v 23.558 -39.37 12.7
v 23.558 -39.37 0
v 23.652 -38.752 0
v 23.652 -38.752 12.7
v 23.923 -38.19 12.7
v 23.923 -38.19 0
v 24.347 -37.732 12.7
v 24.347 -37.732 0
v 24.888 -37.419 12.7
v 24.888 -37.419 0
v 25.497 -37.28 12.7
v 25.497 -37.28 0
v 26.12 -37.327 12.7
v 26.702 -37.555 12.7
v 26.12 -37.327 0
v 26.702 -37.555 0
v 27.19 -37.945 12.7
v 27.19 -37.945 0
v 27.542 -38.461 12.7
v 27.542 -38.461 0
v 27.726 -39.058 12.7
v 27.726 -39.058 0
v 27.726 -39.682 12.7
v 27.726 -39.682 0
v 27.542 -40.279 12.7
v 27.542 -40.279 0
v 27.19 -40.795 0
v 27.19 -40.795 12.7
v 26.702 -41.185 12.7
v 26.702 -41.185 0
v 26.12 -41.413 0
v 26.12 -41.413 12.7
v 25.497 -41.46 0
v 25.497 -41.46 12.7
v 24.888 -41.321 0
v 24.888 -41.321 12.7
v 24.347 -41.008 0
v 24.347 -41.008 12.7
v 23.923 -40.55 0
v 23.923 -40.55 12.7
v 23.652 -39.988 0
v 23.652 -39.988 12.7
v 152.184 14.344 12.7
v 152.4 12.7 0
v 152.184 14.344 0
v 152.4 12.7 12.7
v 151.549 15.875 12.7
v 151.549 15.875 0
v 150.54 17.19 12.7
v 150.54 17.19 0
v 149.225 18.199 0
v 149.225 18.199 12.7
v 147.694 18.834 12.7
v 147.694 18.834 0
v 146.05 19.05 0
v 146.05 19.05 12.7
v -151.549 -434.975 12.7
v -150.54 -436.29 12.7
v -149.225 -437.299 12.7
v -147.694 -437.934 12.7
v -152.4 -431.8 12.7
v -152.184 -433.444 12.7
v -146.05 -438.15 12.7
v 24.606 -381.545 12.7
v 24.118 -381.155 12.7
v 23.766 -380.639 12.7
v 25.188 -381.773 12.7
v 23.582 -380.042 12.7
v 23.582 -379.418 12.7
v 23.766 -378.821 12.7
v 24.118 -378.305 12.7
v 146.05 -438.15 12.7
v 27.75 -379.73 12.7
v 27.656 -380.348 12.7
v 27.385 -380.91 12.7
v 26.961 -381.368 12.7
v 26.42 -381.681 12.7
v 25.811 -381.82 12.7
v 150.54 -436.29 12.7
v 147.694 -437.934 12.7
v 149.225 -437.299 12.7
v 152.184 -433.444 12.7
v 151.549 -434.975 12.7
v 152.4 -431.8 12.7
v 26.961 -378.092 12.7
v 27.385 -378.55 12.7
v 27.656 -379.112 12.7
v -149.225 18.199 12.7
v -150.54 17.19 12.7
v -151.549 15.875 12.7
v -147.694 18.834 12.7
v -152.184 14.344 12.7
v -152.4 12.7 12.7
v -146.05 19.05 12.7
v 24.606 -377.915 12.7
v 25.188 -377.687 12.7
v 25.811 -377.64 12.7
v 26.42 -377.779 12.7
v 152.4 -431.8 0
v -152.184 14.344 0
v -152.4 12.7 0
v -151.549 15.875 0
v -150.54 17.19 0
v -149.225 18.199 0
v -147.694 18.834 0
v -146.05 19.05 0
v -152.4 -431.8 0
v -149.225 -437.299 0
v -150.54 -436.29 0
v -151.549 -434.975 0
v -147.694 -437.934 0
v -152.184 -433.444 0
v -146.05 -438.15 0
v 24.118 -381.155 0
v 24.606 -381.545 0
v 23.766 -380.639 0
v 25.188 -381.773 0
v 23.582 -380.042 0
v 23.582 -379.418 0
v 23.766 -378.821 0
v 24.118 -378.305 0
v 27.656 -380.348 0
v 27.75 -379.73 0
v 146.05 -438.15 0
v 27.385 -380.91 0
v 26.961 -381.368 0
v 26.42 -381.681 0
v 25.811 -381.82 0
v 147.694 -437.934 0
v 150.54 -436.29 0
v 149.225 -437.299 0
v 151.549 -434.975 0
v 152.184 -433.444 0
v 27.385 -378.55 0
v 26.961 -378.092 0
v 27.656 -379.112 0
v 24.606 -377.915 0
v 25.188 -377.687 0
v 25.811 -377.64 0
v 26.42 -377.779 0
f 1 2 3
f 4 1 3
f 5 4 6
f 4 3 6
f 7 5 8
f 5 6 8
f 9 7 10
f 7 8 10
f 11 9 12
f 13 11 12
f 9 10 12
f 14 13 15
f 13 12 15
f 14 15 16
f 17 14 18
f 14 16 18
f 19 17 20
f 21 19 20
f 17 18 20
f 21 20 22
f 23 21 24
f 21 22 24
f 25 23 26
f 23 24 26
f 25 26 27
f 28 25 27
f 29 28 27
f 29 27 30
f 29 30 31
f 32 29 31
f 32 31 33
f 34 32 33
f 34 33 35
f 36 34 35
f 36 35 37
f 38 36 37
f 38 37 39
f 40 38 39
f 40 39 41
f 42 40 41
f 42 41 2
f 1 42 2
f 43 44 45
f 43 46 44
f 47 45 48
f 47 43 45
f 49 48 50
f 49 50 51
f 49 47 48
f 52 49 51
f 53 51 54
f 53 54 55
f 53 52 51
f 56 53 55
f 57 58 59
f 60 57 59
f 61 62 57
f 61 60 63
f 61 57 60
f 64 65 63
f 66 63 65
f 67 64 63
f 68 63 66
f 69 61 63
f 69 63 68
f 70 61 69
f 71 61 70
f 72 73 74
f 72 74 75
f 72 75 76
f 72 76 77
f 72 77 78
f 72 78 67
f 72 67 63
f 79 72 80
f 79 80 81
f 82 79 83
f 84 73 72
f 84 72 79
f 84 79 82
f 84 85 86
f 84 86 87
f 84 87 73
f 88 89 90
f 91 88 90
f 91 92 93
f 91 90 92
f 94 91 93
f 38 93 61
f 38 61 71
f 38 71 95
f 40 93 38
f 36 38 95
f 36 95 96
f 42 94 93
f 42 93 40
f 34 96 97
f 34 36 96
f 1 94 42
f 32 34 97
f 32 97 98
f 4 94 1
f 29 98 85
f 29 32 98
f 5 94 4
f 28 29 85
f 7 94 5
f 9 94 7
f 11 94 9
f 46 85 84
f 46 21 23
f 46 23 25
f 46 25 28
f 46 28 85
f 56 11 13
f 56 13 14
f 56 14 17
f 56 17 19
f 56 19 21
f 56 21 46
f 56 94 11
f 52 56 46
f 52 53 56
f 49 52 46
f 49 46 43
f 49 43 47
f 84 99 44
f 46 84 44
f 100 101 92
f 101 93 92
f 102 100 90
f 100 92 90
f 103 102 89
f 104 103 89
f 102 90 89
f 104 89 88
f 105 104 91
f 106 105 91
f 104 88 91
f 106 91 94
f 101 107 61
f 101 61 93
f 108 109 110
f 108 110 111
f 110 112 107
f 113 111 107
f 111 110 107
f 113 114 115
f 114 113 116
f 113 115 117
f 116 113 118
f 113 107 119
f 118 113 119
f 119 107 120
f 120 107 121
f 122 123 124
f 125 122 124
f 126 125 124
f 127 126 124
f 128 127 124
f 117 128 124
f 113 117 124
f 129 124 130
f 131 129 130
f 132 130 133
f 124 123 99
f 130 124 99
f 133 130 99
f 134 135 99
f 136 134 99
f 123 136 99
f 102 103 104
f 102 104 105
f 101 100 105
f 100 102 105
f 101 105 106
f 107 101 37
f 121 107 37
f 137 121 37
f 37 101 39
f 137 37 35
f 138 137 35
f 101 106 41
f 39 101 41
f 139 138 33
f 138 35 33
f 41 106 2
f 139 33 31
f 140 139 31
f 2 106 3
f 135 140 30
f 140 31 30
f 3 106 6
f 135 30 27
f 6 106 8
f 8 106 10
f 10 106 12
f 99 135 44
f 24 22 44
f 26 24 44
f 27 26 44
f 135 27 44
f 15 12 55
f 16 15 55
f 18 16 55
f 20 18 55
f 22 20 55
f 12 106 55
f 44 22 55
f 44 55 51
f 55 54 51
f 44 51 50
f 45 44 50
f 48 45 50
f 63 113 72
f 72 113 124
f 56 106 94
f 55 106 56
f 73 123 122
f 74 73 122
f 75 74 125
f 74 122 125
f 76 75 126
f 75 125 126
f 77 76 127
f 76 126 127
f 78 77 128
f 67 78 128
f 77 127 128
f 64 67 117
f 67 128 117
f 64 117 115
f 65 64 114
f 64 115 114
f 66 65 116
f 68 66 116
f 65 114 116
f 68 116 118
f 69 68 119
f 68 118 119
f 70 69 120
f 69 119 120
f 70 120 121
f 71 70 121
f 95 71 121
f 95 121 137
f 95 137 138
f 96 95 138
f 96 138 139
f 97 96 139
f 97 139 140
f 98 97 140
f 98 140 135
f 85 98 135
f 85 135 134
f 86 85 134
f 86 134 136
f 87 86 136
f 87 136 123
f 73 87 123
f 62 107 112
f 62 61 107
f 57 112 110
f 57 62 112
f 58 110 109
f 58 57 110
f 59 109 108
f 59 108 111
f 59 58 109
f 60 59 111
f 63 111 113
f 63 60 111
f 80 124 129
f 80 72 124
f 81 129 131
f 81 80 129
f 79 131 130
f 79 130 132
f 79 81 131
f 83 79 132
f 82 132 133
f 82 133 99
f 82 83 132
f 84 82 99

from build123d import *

# Parameters (mm, degrees)
SKETCH2_W           = 304.8
SKETCH2_H           = 457.2
BOSS_EXTRUDE1_DEPTH = 12.7
FILLET1_R           = 6.35
SKETCH4_R           = 2.0955
CUT_EXTRUDE1_DEPTH  = 465.071624321


with BuildPart() as part:
    # Sketch2 → Boss-Extrude1 (new body)
    with BuildSketch(Plane.XY):
        with Locations((0, -209.55)):
            Rectangle(SKETCH2_W, SKETCH2_H)
    extrude(amount=BOSS_EXTRUDE1_DEPTH)

    # Fillet1
    fillet1_edges = [part.edges().sort_by_distance(p)[0] for p in [
        (152.4, -438.15, 6.35),
        (-152.4, -438.15, 6.35),
        (-152.4, 19.05, 6.35),
        (152.4, 19.05, 6.35),
    ]]
    fillet(fillet1_edges, radius=FILLET1_R)

    # Sketch4 → Cut-Extrude1 (cut, through all)
    with BuildSketch(Plane(origin=(0, 0, 0), x_dir=(-1, 0, 0), z_dir=(0, 0, -1))):
        with Locations((-25.654, -39.37)):
            Circle(SKETCH4_R)
        with Locations(Location((-25.654, -379.73, 0), (0, 0, 180))):
            Circle(SKETCH4_R)
    extrude(amount=-CUT_EXTRUDE1_DEPTH, mode=Mode.SUBTRACT)


solid = part.part
